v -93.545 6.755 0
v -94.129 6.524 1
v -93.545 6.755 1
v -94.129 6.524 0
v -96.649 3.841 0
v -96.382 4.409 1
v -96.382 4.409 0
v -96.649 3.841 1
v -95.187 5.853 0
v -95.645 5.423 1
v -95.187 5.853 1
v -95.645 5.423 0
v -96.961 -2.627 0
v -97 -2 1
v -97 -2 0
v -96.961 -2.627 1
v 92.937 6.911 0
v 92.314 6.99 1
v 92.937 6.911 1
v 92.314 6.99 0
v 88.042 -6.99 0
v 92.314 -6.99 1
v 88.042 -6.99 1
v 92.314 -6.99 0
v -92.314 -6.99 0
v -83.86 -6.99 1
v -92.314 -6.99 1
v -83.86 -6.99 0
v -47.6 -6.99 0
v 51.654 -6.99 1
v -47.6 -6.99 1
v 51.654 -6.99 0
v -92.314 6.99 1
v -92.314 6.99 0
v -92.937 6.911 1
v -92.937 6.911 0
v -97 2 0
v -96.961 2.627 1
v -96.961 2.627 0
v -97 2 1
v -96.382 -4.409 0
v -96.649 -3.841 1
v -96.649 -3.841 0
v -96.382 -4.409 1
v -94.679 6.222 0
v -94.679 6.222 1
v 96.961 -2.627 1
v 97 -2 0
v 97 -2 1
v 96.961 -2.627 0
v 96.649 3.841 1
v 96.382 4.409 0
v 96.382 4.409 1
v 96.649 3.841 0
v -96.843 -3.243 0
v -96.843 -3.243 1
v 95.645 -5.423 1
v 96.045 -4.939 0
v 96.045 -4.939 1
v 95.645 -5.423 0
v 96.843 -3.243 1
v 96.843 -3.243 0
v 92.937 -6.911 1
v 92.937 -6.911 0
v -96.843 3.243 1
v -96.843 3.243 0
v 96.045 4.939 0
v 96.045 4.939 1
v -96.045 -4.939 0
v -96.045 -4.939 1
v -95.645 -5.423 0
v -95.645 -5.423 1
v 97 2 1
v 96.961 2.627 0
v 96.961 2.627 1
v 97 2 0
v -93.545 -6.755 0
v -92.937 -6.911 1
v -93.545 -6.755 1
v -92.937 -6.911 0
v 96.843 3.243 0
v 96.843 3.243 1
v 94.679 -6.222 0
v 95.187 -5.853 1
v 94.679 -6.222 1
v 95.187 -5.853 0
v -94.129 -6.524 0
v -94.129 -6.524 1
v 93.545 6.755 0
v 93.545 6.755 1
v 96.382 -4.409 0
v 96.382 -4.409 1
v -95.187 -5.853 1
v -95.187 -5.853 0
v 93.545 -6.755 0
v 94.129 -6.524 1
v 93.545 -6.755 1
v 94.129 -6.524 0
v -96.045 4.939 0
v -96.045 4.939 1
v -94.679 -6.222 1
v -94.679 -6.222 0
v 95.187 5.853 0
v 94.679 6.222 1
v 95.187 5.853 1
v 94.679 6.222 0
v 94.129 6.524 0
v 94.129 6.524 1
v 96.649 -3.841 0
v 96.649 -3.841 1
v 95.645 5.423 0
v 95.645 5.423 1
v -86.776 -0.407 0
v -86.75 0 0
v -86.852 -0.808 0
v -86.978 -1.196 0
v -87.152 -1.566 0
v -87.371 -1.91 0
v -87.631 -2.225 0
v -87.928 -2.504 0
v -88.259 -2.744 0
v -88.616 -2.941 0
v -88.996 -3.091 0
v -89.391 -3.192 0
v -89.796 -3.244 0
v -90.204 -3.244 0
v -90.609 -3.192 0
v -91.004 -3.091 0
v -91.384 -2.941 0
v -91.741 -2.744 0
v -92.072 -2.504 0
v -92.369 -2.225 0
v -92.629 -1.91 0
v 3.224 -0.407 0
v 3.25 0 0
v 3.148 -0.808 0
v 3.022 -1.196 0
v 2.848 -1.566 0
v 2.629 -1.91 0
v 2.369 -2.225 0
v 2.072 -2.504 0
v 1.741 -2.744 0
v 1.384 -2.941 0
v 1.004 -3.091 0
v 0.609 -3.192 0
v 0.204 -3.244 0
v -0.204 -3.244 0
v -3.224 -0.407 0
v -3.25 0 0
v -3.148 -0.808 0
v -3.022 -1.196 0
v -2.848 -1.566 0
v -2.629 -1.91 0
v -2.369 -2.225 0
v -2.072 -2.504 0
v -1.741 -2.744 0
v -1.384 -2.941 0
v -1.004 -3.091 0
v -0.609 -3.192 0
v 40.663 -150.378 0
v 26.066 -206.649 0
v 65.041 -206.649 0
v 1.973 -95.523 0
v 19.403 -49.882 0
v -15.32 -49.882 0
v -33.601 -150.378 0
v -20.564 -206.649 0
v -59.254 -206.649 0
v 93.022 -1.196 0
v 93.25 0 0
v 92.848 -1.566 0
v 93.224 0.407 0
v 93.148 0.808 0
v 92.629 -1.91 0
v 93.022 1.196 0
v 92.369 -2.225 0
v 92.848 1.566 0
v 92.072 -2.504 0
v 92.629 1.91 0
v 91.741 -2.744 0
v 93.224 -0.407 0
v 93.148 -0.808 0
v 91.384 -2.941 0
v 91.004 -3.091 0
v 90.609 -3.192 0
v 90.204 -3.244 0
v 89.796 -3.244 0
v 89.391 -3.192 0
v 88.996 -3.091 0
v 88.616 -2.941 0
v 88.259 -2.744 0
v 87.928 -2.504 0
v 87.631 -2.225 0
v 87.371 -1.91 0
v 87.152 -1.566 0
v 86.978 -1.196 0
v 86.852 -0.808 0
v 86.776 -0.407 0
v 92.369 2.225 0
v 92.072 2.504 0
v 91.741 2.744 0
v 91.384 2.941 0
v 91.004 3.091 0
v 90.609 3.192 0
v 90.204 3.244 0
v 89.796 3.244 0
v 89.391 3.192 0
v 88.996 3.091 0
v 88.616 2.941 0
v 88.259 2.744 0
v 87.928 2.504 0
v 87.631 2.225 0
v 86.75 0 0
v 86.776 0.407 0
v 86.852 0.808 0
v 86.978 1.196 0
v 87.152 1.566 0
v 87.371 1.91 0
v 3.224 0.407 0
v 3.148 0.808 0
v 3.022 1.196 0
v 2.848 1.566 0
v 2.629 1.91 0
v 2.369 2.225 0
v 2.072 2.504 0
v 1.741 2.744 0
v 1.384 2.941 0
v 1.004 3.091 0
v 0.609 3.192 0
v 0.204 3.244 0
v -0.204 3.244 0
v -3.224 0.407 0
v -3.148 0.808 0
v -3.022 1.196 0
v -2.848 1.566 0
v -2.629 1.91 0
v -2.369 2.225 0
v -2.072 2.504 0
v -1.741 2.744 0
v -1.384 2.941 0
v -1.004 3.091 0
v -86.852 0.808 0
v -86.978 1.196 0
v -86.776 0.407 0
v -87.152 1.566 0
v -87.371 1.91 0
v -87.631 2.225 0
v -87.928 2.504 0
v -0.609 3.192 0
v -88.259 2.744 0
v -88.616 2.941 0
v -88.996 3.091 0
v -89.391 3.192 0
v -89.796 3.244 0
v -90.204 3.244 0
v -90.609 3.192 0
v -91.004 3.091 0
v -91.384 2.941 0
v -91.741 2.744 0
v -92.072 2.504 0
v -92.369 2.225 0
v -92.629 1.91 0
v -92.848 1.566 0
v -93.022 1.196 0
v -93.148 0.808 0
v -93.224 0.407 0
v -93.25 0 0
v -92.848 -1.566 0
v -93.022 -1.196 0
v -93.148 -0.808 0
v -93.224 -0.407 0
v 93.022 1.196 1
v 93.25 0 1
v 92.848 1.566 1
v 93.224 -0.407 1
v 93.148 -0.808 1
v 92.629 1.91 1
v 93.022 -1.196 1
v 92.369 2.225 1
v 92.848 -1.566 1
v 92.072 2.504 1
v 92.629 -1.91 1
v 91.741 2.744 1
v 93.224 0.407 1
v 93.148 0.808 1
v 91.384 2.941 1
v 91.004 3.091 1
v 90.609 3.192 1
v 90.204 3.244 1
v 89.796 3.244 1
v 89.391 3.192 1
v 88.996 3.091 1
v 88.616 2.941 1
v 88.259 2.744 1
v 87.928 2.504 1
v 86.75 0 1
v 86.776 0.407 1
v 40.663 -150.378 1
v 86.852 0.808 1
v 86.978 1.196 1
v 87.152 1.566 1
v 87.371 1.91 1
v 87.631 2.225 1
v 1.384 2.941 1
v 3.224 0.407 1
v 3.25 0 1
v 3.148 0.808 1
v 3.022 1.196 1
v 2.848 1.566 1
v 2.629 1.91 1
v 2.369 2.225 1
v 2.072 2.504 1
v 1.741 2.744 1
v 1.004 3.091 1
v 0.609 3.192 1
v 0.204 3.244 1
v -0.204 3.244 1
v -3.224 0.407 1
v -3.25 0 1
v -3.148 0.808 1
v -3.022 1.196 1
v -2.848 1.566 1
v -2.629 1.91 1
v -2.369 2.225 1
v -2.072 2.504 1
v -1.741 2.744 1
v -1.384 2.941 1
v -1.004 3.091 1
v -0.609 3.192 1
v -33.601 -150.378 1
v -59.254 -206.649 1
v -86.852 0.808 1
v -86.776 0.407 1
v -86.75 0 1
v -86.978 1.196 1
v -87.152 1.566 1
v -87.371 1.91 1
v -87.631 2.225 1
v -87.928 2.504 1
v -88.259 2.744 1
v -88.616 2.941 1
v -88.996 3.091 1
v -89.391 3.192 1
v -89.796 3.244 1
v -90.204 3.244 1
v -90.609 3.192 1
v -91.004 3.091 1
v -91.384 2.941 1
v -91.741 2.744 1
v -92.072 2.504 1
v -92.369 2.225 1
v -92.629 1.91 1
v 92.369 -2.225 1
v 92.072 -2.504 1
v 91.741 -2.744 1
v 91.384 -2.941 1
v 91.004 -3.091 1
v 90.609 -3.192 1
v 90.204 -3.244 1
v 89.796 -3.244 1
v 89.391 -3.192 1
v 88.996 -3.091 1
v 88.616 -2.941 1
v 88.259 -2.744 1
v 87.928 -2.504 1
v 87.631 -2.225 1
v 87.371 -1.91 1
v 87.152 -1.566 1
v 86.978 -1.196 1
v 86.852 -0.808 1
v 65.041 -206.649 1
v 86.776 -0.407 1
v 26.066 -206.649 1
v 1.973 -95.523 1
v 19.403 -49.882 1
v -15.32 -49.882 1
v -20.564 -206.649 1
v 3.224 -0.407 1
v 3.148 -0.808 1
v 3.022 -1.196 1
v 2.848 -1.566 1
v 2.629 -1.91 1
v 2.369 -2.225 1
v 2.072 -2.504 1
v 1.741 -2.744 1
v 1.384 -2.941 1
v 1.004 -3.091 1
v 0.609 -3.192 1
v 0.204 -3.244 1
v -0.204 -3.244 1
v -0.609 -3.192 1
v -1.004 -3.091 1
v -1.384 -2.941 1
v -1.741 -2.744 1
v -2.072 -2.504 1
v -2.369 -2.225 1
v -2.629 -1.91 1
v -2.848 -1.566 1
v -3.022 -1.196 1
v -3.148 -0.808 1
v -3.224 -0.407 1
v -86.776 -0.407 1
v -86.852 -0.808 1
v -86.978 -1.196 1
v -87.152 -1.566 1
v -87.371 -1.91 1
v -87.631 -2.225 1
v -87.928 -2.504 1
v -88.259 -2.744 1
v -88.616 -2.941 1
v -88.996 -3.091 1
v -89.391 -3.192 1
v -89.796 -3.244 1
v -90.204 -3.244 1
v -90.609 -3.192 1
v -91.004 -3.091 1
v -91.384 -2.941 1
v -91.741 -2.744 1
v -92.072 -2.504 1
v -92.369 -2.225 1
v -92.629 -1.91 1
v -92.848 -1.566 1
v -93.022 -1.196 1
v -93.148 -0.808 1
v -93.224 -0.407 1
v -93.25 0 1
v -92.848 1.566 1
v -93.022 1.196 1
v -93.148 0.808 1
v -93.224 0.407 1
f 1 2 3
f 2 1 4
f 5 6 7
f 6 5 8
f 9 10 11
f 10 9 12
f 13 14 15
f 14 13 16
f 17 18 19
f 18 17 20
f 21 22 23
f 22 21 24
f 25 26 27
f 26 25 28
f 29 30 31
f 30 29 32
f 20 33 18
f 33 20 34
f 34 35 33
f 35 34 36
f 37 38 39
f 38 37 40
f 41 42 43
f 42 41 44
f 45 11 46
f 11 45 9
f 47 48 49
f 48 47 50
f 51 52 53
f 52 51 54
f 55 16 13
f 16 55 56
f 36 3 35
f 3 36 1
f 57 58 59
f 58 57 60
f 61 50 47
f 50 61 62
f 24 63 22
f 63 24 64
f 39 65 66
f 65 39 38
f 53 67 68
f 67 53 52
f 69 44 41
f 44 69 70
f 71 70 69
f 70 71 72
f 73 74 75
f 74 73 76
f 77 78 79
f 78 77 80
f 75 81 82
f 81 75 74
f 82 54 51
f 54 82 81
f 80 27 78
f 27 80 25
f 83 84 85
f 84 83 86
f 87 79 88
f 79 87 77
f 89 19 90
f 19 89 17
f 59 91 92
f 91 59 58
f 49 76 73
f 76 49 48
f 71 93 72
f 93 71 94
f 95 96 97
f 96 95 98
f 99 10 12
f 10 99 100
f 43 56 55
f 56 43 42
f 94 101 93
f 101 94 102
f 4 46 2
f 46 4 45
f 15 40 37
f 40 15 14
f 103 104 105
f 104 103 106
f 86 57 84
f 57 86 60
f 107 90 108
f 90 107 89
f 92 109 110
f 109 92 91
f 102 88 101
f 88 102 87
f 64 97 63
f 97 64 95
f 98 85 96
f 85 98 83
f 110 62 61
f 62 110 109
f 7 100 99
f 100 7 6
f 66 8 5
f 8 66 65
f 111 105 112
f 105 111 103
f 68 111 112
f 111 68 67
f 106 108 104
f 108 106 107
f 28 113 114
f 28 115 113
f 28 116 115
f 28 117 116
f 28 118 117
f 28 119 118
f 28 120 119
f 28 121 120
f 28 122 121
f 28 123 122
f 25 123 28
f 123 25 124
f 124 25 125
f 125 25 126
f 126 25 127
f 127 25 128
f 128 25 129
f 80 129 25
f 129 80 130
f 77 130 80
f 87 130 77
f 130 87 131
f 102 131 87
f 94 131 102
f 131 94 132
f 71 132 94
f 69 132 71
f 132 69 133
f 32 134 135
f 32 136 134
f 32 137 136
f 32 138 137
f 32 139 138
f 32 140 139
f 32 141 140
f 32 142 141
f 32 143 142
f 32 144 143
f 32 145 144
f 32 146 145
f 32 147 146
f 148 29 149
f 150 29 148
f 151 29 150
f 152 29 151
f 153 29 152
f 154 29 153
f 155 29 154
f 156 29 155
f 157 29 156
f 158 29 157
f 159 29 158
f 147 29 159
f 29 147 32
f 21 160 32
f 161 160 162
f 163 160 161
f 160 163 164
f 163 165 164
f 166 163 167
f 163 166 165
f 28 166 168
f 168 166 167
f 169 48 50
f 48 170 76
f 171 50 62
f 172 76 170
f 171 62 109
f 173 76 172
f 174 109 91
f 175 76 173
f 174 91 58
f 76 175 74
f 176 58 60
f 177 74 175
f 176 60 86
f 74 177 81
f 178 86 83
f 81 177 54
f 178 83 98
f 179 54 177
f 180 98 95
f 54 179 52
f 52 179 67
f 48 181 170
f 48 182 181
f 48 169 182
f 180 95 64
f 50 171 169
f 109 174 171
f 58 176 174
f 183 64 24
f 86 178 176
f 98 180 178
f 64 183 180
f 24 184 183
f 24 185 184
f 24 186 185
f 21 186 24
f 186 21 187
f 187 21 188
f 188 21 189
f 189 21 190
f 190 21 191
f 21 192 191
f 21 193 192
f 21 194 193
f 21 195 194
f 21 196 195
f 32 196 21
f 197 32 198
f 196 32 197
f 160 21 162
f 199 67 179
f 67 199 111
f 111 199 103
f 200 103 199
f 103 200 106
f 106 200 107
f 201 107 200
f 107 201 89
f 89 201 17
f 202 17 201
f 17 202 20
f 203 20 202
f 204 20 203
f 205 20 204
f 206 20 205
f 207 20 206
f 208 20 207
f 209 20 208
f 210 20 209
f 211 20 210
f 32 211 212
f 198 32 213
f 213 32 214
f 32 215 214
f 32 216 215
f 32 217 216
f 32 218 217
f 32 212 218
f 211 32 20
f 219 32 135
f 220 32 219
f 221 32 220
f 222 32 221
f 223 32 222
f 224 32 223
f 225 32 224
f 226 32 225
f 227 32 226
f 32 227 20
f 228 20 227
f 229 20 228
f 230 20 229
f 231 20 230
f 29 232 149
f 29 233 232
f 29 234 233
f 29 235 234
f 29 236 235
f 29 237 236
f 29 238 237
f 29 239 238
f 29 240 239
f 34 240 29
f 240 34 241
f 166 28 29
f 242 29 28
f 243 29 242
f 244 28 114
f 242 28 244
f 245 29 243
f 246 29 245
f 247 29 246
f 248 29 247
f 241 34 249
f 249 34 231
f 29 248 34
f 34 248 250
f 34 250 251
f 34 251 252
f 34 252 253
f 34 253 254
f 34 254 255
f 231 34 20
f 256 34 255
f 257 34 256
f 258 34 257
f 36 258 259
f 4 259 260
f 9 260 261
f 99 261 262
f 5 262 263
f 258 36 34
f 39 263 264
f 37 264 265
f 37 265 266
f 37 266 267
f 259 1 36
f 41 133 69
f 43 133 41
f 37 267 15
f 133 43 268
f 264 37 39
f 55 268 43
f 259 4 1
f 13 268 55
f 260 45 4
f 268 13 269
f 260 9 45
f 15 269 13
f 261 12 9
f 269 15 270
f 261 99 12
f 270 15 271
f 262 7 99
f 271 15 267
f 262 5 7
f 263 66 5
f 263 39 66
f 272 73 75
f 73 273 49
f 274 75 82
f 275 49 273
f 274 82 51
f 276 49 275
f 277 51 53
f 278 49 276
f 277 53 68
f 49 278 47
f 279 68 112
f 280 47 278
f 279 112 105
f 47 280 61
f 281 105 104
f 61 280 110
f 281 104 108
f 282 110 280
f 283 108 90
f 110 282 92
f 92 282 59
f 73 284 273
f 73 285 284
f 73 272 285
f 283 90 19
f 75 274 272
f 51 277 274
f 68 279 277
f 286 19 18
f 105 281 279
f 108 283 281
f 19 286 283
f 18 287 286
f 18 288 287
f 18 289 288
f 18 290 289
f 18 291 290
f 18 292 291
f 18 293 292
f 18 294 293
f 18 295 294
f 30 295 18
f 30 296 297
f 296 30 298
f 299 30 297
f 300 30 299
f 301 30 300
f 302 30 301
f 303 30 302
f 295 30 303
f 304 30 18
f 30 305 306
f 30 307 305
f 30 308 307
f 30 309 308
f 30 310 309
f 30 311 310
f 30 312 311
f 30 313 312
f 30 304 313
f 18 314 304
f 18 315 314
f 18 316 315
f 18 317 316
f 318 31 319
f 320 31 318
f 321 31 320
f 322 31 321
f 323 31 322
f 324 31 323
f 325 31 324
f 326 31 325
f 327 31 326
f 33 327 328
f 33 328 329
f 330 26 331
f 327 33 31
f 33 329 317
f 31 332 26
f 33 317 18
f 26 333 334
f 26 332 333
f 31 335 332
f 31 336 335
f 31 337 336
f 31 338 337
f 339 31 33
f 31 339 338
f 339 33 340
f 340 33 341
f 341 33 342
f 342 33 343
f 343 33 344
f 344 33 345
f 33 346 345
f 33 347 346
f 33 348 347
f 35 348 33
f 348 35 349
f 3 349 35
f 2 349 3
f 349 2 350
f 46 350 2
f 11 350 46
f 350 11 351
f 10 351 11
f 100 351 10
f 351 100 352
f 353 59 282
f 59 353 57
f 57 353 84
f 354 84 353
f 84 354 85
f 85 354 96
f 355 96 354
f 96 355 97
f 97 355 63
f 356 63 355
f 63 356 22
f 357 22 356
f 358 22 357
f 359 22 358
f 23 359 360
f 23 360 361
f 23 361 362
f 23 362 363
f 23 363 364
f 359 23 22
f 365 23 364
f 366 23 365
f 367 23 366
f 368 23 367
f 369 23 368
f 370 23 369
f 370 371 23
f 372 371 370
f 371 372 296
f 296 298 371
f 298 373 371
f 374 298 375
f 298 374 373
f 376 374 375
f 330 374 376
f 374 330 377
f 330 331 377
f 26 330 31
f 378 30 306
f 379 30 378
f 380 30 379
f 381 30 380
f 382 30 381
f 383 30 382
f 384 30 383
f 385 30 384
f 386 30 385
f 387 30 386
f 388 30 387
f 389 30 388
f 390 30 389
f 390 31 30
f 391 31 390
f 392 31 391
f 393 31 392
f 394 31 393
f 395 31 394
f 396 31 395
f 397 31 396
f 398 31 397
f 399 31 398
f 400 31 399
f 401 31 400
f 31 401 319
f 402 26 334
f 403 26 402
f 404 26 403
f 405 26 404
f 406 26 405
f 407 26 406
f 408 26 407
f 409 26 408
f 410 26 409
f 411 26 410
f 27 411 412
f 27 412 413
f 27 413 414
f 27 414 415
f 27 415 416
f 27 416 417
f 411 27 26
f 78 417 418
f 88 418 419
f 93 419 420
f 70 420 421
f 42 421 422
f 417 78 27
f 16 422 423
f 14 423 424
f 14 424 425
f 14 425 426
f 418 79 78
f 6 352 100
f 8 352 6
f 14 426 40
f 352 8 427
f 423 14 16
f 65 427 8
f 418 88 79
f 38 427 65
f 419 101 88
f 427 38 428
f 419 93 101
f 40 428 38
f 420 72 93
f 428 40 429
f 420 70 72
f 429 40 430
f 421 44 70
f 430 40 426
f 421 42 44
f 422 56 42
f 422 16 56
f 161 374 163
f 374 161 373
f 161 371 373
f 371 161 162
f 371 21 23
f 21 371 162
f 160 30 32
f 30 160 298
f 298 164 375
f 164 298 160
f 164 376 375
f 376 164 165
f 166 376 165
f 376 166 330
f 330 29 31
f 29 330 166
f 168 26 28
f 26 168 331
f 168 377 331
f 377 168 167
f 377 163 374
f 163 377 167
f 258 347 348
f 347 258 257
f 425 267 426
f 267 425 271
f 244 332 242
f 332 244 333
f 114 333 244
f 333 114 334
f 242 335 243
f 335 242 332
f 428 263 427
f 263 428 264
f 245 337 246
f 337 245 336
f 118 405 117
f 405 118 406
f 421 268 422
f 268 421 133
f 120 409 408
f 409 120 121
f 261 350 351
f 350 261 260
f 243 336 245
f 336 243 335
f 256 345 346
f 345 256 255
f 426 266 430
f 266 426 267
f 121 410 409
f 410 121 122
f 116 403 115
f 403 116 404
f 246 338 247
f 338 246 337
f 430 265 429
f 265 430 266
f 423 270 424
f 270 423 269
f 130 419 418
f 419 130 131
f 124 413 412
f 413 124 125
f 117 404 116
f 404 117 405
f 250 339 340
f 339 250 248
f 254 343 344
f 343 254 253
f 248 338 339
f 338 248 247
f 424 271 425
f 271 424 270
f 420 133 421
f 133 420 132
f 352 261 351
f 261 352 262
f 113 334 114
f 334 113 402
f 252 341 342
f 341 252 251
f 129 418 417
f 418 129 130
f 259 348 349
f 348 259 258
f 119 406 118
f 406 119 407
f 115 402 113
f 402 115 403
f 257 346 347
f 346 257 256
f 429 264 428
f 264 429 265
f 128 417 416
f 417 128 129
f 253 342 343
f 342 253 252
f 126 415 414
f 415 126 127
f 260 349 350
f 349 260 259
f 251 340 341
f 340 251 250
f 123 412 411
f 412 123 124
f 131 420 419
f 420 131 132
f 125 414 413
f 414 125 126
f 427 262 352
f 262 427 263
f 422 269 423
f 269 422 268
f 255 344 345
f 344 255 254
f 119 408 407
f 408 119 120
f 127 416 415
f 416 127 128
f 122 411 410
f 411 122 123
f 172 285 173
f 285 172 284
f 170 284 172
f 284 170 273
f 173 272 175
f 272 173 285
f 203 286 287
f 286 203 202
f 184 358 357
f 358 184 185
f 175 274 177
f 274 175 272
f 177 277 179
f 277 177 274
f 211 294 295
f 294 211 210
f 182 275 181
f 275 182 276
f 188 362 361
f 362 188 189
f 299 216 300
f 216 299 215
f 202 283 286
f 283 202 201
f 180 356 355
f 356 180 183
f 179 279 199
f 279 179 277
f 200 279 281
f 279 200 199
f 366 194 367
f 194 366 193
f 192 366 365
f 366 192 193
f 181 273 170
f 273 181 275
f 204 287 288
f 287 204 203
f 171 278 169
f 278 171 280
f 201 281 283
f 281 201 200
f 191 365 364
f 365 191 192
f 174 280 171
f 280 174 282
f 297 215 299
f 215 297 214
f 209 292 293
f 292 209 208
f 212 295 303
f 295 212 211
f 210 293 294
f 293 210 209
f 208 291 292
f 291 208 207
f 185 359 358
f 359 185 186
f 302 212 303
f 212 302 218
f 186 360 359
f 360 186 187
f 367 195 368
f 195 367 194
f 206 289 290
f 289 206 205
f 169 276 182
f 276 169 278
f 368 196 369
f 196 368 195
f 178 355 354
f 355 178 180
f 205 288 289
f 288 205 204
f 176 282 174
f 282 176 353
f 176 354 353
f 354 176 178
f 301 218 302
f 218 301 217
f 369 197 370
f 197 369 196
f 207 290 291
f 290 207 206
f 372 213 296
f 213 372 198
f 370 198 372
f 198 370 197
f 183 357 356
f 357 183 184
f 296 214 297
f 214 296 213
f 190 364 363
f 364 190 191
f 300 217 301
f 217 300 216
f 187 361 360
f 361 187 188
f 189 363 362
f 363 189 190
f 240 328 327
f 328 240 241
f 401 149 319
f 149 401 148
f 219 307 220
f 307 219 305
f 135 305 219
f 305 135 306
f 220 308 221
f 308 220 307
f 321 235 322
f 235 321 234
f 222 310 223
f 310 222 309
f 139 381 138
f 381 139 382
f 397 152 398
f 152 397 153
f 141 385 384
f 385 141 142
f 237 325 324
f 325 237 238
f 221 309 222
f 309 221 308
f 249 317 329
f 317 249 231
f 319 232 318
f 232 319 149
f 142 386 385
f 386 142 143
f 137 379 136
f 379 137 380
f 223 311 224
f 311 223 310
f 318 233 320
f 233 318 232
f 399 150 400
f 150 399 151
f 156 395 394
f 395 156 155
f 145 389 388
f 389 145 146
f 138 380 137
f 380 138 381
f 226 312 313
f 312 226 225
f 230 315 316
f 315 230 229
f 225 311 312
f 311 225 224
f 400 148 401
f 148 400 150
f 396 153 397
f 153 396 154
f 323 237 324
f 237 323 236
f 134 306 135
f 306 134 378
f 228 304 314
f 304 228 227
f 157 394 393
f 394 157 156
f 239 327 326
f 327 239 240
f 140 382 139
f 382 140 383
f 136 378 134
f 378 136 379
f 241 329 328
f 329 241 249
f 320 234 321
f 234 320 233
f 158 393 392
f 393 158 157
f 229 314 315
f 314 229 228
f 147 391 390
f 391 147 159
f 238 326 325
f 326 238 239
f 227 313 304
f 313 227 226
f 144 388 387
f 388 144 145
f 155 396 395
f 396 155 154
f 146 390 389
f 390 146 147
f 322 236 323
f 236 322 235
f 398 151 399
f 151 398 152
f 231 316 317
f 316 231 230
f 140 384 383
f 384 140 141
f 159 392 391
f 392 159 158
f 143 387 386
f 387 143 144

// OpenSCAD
$fn = 50;


difference() {
	union() {
		translate(v = [0, 0, 0]) {
			rotate(a = [0, 0, 0]) {
				hull() {
					translate(v = [-92.0000000000, 2.0000000000, 0]) {
						rotate(a = [0, 0, 0]) {
							translate(v = [0, 0, 0]) {
								rotate(a = [0, 0, 0]) {
									cylinder(h = 1, r = 5);
								}
							}
						}
					}
					translate(v = [92.0000000000, 2.0000000000, 0]) {
						rotate(a = [0, 0, 0]) {
							translate(v = [0, 0, 0]) {
								rotate(a = [0, 0, 0]) {
									cylinder(h = 1, r = 5);
								}
							}
						}
					}
					translate(v = [-92.0000000000, -2.0000000000, 0]) {
						rotate(a = [0, 0, 0]) {
							translate(v = [0, 0, 0]) {
								rotate(a = [0, 0, 0]) {
									cylinder(h = 1, r = 5);
								}
							}
						}
					}
					translate(v = [92.0000000000, -2.0000000000, 0]) {
						rotate(a = [0, 0, 0]) {
							translate(v = [0, 0, 0]) {
								rotate(a = [0, 0, 0]) {
									cylinder(h = 1, r = 5);
								}
							}
						}
					}
				}
			}
		}
		translate(v = [0, 0, 0]) {
			rotate(a = [0, 0, 0]) {
				linear_extrude(height = 1) {
					text(font = "DejaVu Sans Mono:style=Bold", halign = "center", size = 209.0000000000, text = "W", valign = "top");
				}
			}
		}
	}
	union() {
		translate(v = [-90.0000000000, 0.0000000000, -125.0000000000]) {
			rotate(a = [0, 0, 0]) {
				cylinder(h = 250, r = 3.2500000000);
			}
		}
		translate(v = [90.0000000000, 0.0000000000, -125.0000000000]) {
			rotate(a = [0, 0, 0]) {
				cylinder(h = 250, r = 3.2500000000);
			}
		}
		translate(v = [90.0000000000, 0.0000000000, -125.0000000000]) {
			rotate(a = [0, 0, 0]) {
				cylinder(h = 250, r = 3.2500000000);
			}
		}
		translate(v = [0, 0, -125.0000000000]) {
			rotate(a = [0, 0, 0]) {
				cylinder(h = 250, r = 3.2500000000);
			}
		}
	}
}
